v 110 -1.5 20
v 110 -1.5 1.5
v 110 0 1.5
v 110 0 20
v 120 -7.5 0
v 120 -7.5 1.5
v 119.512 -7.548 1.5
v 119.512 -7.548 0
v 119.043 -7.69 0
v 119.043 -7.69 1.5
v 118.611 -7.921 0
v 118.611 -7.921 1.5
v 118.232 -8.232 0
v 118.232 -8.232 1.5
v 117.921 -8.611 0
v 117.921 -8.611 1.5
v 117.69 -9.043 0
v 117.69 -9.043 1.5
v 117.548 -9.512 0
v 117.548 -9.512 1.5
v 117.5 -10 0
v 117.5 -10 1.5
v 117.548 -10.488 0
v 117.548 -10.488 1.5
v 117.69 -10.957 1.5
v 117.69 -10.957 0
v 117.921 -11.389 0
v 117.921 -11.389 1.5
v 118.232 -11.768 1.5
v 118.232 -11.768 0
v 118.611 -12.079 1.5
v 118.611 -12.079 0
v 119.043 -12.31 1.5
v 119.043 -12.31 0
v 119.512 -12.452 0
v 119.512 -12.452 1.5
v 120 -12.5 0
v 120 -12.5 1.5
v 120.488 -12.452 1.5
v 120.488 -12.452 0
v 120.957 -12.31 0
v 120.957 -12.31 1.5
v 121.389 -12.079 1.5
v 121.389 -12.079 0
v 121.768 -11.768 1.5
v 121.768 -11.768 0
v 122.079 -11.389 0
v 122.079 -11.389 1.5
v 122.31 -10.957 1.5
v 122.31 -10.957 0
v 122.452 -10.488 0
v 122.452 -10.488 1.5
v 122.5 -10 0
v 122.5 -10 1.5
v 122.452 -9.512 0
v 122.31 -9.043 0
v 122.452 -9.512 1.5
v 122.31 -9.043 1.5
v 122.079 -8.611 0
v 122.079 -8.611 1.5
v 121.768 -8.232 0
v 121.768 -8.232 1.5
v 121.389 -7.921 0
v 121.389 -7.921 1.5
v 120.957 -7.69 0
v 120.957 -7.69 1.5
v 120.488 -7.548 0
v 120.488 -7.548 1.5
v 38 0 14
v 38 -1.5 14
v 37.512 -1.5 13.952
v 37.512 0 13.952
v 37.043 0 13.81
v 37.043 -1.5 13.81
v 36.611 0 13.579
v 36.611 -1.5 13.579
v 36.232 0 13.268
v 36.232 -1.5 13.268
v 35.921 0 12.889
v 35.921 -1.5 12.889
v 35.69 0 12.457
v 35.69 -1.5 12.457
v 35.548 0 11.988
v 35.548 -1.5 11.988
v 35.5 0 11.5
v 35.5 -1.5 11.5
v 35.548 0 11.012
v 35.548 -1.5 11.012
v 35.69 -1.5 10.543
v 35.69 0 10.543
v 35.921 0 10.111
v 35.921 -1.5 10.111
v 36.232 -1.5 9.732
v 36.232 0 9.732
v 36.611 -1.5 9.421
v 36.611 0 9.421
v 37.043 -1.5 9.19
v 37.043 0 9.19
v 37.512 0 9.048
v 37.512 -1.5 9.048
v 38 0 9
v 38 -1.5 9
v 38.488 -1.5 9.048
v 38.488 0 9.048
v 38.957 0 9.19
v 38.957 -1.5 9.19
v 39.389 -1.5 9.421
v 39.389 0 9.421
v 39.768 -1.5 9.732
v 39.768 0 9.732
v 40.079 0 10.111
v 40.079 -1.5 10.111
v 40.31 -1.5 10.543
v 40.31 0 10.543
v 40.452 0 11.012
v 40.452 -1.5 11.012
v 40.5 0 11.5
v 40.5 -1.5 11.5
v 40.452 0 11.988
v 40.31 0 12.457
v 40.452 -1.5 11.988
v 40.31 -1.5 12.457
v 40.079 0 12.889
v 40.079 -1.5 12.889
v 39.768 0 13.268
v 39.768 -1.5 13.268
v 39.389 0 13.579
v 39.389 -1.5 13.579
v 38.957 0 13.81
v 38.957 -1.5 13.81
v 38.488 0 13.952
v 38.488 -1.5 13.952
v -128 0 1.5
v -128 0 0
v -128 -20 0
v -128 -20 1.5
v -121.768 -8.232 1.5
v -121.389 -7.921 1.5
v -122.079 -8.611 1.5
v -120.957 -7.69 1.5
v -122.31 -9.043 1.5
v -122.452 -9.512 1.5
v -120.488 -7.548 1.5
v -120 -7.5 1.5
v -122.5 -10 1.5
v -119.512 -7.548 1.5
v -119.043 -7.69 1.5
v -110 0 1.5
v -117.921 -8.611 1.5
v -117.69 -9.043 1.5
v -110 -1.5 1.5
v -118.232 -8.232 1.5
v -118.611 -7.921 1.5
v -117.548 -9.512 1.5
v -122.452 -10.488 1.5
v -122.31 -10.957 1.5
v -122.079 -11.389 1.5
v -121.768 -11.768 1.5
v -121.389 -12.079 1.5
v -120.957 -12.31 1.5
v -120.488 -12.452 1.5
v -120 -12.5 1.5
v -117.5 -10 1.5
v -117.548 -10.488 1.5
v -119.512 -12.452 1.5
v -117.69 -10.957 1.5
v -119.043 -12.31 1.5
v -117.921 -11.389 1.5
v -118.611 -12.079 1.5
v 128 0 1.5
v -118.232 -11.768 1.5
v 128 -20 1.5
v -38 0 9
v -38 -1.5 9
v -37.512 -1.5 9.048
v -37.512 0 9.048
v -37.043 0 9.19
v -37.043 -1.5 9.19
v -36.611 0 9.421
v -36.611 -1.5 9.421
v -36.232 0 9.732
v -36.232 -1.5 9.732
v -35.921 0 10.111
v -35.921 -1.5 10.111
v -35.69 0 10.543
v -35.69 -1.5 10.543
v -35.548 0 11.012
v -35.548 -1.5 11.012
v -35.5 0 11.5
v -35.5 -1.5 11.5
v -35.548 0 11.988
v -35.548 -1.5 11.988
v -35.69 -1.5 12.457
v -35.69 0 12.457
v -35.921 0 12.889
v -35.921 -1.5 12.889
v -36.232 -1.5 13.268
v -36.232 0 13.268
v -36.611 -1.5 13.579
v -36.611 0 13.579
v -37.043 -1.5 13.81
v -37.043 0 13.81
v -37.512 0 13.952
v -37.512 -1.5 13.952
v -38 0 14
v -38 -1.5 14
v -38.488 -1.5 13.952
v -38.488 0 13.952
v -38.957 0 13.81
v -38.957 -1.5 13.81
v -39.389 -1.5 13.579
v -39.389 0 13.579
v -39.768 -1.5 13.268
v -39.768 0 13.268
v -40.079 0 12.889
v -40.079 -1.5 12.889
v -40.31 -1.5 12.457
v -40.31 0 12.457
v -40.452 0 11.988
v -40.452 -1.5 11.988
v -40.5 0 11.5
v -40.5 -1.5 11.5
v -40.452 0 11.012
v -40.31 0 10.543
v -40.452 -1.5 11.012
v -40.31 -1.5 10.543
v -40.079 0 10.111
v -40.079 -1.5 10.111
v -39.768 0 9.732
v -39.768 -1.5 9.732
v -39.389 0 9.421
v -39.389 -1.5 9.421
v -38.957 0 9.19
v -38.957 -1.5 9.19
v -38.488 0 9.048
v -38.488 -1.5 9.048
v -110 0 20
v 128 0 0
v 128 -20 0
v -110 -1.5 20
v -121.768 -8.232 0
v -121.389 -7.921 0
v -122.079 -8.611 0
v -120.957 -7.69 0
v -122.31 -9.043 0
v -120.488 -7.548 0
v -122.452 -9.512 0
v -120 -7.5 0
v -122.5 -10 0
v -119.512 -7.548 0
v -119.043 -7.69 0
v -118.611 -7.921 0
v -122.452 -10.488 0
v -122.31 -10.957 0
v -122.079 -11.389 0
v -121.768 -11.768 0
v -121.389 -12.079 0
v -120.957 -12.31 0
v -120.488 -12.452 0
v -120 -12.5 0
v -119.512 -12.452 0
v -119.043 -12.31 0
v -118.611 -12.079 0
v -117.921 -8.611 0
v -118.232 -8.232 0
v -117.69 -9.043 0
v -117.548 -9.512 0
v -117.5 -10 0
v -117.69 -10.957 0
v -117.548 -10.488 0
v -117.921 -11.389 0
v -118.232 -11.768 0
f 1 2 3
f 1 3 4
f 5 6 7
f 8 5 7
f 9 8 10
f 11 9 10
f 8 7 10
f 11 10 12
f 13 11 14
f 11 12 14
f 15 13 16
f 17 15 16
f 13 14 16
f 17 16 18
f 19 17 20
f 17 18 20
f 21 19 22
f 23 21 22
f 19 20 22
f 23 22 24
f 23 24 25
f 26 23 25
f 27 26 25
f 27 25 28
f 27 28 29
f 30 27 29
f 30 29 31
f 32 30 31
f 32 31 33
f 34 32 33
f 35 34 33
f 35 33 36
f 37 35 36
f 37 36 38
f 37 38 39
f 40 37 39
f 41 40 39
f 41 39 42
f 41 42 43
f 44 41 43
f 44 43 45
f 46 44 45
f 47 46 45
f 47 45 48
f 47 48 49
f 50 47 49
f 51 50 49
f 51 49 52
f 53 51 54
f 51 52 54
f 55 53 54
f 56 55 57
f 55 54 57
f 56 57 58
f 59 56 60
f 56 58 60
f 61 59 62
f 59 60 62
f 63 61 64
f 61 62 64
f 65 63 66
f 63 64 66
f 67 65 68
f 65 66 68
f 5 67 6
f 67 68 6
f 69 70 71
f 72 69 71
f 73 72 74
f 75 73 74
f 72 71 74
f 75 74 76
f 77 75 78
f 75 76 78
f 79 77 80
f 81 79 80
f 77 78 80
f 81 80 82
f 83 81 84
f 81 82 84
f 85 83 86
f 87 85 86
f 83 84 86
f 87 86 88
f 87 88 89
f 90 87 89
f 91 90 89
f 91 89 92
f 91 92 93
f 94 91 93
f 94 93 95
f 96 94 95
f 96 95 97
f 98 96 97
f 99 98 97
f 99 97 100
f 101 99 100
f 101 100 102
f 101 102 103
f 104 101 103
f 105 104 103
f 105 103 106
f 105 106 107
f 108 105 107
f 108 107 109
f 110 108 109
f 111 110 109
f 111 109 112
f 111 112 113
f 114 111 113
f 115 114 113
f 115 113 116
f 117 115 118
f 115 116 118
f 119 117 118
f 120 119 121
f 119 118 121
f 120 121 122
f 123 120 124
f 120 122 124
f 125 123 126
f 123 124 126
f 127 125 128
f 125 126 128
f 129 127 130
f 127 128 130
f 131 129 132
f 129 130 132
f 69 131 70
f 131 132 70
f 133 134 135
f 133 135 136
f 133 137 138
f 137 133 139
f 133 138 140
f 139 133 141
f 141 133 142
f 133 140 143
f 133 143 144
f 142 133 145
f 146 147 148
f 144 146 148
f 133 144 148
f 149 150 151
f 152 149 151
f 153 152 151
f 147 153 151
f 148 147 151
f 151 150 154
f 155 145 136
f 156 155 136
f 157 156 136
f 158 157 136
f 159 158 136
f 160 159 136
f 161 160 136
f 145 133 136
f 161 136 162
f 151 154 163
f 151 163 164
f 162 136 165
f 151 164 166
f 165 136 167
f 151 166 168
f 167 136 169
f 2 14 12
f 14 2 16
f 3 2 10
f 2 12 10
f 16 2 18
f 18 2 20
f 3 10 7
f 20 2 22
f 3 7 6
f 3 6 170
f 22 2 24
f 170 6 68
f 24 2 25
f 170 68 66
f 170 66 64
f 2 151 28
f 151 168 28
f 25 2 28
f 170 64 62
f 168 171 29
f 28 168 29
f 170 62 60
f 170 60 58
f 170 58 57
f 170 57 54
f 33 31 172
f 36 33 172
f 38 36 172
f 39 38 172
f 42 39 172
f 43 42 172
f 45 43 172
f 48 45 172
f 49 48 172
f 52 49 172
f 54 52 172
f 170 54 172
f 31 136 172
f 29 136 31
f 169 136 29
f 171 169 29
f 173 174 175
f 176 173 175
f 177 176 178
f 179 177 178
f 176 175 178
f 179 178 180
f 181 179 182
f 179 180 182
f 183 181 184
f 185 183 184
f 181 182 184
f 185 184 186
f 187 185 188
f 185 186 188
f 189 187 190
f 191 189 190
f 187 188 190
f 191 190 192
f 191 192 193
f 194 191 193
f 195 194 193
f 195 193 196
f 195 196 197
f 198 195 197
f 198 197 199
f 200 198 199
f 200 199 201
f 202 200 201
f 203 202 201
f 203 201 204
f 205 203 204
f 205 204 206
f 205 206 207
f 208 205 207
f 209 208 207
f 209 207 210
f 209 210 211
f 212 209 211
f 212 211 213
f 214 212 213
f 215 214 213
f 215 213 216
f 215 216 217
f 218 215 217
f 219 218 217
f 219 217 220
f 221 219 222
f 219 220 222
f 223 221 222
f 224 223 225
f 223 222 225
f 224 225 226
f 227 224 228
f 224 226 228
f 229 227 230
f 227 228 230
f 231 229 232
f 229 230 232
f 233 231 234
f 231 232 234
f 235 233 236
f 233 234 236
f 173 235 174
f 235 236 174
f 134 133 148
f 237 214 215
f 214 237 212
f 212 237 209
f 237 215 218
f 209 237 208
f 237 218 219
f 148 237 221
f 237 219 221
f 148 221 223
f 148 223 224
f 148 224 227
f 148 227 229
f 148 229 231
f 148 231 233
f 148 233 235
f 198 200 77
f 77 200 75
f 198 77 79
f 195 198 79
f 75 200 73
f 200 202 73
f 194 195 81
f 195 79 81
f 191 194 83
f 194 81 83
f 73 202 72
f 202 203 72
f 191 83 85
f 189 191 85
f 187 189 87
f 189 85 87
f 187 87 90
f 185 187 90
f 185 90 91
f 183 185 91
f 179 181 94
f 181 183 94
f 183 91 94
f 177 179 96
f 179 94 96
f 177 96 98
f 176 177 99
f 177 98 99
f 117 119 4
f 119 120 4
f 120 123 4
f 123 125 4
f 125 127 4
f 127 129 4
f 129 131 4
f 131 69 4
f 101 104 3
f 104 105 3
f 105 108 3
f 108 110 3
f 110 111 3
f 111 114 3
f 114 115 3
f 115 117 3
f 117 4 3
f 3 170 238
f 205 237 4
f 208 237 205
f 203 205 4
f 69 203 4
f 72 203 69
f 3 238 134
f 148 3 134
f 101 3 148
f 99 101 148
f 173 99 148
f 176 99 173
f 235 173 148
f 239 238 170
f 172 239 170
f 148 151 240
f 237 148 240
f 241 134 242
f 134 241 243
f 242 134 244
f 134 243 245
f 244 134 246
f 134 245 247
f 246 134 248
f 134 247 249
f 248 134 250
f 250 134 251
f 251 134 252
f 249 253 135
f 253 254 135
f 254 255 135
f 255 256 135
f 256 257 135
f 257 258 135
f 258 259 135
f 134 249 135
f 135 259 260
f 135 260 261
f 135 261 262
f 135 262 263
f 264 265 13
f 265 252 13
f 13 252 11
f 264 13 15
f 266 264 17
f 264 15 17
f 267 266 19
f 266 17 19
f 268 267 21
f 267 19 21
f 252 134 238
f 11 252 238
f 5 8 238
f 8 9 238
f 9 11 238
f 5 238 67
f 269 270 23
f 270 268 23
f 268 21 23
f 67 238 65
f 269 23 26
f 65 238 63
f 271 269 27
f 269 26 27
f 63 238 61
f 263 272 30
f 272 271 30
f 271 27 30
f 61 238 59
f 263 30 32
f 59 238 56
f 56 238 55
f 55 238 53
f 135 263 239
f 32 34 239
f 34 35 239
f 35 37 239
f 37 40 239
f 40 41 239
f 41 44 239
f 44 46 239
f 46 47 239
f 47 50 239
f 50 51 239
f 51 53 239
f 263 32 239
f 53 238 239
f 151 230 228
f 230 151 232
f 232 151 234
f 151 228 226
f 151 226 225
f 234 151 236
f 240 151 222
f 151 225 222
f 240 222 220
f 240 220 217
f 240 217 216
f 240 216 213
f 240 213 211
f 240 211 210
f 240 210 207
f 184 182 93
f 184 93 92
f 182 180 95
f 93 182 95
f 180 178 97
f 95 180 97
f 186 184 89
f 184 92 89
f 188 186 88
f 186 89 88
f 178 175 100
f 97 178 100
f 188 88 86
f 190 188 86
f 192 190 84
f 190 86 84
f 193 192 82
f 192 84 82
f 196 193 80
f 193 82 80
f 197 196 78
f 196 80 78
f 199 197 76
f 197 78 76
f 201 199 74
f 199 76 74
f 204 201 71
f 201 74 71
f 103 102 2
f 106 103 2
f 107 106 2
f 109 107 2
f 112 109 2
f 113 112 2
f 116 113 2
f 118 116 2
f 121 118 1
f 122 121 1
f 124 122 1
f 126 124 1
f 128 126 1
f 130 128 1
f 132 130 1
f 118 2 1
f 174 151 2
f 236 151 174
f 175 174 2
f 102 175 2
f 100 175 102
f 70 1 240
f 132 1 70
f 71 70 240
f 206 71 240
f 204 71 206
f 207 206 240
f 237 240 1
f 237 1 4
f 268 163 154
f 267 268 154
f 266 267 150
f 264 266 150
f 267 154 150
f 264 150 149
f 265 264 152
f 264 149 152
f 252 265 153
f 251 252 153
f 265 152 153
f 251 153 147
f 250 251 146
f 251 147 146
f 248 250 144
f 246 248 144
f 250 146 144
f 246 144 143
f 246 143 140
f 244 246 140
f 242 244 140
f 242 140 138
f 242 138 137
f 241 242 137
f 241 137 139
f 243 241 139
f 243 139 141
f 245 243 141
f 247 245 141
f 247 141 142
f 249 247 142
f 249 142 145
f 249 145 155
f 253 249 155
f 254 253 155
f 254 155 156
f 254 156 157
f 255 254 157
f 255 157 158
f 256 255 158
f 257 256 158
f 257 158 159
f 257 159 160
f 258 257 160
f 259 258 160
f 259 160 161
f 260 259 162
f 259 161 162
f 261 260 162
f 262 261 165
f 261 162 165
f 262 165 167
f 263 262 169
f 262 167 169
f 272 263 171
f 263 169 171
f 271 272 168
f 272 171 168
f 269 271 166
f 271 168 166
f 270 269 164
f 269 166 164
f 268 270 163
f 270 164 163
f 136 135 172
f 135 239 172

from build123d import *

# Parameters (mm, degrees)
EXTRU_MINCE1_DEPTH      = 128
ESQUISSE2_R             = 2.5
ENL_V_MAT_EXTRU_1_DEPTH = 10
ESQUISSE3_R             = 2.5
ESQUISSE3_W             = 18
ESQUISSE3_H             = 18.5
ENL_V_MAT_EXTRU_2_DEPTH = 10


with BuildPart() as part:
    # Esquisse1 → Extru.-Mince1 (new, symmetric)
    with BuildSketch(Plane(origin=(0, 0, 0), x_dir=(0, 0, -1), z_dir=(1, 0, 0))):
        Polygon((-20, 0), (0, 0), (0, -20), (-1.5, -20), (-1.5, -1.5), (-20, -1.5), align=None)
    extrude(amount=EXTRU_MINCE1_DEPTH, both=True)

    # Esquisse2 → Enlèv. mat.-Extru.1 (cut)
    with BuildSketch(Plane.XY.offset(1.5)):
        with Locations((-120, -10)):
            Circle(ESQUISSE2_R)
        with Locations(Location((120, -10, 0), (0, 0, 90))):
            Circle(ESQUISSE2_R)
    extrude(amount=-ENL_V_MAT_EXTRU_1_DEPTH, mode=Mode.SUBTRACT)

    # Esquisse3 → Enlèv. mat.-Extru.2 (cut)
    with BuildSketch(Plane.XZ.offset(1.5)):
        with Locations(Location((-38, 11.5, 0), (0, 0, 270))):
            Circle(ESQUISSE3_R)
        with Locations(Location((38, 11.5, 0), (0, 0, 90))):
            Circle(ESQUISSE3_R)
        with Locations((-119, 10.75)):
            Rectangle(ESQUISSE3_W, ESQUISSE3_H)
        with Locations((119, 10.75)):
            Rectangle(ESQUISSE3_W, ESQUISSE3_H)
    extrude(amount=-ENL_V_MAT_EXTRU_2_DEPTH, mode=Mode.SUBTRACT)


solid = part.part
